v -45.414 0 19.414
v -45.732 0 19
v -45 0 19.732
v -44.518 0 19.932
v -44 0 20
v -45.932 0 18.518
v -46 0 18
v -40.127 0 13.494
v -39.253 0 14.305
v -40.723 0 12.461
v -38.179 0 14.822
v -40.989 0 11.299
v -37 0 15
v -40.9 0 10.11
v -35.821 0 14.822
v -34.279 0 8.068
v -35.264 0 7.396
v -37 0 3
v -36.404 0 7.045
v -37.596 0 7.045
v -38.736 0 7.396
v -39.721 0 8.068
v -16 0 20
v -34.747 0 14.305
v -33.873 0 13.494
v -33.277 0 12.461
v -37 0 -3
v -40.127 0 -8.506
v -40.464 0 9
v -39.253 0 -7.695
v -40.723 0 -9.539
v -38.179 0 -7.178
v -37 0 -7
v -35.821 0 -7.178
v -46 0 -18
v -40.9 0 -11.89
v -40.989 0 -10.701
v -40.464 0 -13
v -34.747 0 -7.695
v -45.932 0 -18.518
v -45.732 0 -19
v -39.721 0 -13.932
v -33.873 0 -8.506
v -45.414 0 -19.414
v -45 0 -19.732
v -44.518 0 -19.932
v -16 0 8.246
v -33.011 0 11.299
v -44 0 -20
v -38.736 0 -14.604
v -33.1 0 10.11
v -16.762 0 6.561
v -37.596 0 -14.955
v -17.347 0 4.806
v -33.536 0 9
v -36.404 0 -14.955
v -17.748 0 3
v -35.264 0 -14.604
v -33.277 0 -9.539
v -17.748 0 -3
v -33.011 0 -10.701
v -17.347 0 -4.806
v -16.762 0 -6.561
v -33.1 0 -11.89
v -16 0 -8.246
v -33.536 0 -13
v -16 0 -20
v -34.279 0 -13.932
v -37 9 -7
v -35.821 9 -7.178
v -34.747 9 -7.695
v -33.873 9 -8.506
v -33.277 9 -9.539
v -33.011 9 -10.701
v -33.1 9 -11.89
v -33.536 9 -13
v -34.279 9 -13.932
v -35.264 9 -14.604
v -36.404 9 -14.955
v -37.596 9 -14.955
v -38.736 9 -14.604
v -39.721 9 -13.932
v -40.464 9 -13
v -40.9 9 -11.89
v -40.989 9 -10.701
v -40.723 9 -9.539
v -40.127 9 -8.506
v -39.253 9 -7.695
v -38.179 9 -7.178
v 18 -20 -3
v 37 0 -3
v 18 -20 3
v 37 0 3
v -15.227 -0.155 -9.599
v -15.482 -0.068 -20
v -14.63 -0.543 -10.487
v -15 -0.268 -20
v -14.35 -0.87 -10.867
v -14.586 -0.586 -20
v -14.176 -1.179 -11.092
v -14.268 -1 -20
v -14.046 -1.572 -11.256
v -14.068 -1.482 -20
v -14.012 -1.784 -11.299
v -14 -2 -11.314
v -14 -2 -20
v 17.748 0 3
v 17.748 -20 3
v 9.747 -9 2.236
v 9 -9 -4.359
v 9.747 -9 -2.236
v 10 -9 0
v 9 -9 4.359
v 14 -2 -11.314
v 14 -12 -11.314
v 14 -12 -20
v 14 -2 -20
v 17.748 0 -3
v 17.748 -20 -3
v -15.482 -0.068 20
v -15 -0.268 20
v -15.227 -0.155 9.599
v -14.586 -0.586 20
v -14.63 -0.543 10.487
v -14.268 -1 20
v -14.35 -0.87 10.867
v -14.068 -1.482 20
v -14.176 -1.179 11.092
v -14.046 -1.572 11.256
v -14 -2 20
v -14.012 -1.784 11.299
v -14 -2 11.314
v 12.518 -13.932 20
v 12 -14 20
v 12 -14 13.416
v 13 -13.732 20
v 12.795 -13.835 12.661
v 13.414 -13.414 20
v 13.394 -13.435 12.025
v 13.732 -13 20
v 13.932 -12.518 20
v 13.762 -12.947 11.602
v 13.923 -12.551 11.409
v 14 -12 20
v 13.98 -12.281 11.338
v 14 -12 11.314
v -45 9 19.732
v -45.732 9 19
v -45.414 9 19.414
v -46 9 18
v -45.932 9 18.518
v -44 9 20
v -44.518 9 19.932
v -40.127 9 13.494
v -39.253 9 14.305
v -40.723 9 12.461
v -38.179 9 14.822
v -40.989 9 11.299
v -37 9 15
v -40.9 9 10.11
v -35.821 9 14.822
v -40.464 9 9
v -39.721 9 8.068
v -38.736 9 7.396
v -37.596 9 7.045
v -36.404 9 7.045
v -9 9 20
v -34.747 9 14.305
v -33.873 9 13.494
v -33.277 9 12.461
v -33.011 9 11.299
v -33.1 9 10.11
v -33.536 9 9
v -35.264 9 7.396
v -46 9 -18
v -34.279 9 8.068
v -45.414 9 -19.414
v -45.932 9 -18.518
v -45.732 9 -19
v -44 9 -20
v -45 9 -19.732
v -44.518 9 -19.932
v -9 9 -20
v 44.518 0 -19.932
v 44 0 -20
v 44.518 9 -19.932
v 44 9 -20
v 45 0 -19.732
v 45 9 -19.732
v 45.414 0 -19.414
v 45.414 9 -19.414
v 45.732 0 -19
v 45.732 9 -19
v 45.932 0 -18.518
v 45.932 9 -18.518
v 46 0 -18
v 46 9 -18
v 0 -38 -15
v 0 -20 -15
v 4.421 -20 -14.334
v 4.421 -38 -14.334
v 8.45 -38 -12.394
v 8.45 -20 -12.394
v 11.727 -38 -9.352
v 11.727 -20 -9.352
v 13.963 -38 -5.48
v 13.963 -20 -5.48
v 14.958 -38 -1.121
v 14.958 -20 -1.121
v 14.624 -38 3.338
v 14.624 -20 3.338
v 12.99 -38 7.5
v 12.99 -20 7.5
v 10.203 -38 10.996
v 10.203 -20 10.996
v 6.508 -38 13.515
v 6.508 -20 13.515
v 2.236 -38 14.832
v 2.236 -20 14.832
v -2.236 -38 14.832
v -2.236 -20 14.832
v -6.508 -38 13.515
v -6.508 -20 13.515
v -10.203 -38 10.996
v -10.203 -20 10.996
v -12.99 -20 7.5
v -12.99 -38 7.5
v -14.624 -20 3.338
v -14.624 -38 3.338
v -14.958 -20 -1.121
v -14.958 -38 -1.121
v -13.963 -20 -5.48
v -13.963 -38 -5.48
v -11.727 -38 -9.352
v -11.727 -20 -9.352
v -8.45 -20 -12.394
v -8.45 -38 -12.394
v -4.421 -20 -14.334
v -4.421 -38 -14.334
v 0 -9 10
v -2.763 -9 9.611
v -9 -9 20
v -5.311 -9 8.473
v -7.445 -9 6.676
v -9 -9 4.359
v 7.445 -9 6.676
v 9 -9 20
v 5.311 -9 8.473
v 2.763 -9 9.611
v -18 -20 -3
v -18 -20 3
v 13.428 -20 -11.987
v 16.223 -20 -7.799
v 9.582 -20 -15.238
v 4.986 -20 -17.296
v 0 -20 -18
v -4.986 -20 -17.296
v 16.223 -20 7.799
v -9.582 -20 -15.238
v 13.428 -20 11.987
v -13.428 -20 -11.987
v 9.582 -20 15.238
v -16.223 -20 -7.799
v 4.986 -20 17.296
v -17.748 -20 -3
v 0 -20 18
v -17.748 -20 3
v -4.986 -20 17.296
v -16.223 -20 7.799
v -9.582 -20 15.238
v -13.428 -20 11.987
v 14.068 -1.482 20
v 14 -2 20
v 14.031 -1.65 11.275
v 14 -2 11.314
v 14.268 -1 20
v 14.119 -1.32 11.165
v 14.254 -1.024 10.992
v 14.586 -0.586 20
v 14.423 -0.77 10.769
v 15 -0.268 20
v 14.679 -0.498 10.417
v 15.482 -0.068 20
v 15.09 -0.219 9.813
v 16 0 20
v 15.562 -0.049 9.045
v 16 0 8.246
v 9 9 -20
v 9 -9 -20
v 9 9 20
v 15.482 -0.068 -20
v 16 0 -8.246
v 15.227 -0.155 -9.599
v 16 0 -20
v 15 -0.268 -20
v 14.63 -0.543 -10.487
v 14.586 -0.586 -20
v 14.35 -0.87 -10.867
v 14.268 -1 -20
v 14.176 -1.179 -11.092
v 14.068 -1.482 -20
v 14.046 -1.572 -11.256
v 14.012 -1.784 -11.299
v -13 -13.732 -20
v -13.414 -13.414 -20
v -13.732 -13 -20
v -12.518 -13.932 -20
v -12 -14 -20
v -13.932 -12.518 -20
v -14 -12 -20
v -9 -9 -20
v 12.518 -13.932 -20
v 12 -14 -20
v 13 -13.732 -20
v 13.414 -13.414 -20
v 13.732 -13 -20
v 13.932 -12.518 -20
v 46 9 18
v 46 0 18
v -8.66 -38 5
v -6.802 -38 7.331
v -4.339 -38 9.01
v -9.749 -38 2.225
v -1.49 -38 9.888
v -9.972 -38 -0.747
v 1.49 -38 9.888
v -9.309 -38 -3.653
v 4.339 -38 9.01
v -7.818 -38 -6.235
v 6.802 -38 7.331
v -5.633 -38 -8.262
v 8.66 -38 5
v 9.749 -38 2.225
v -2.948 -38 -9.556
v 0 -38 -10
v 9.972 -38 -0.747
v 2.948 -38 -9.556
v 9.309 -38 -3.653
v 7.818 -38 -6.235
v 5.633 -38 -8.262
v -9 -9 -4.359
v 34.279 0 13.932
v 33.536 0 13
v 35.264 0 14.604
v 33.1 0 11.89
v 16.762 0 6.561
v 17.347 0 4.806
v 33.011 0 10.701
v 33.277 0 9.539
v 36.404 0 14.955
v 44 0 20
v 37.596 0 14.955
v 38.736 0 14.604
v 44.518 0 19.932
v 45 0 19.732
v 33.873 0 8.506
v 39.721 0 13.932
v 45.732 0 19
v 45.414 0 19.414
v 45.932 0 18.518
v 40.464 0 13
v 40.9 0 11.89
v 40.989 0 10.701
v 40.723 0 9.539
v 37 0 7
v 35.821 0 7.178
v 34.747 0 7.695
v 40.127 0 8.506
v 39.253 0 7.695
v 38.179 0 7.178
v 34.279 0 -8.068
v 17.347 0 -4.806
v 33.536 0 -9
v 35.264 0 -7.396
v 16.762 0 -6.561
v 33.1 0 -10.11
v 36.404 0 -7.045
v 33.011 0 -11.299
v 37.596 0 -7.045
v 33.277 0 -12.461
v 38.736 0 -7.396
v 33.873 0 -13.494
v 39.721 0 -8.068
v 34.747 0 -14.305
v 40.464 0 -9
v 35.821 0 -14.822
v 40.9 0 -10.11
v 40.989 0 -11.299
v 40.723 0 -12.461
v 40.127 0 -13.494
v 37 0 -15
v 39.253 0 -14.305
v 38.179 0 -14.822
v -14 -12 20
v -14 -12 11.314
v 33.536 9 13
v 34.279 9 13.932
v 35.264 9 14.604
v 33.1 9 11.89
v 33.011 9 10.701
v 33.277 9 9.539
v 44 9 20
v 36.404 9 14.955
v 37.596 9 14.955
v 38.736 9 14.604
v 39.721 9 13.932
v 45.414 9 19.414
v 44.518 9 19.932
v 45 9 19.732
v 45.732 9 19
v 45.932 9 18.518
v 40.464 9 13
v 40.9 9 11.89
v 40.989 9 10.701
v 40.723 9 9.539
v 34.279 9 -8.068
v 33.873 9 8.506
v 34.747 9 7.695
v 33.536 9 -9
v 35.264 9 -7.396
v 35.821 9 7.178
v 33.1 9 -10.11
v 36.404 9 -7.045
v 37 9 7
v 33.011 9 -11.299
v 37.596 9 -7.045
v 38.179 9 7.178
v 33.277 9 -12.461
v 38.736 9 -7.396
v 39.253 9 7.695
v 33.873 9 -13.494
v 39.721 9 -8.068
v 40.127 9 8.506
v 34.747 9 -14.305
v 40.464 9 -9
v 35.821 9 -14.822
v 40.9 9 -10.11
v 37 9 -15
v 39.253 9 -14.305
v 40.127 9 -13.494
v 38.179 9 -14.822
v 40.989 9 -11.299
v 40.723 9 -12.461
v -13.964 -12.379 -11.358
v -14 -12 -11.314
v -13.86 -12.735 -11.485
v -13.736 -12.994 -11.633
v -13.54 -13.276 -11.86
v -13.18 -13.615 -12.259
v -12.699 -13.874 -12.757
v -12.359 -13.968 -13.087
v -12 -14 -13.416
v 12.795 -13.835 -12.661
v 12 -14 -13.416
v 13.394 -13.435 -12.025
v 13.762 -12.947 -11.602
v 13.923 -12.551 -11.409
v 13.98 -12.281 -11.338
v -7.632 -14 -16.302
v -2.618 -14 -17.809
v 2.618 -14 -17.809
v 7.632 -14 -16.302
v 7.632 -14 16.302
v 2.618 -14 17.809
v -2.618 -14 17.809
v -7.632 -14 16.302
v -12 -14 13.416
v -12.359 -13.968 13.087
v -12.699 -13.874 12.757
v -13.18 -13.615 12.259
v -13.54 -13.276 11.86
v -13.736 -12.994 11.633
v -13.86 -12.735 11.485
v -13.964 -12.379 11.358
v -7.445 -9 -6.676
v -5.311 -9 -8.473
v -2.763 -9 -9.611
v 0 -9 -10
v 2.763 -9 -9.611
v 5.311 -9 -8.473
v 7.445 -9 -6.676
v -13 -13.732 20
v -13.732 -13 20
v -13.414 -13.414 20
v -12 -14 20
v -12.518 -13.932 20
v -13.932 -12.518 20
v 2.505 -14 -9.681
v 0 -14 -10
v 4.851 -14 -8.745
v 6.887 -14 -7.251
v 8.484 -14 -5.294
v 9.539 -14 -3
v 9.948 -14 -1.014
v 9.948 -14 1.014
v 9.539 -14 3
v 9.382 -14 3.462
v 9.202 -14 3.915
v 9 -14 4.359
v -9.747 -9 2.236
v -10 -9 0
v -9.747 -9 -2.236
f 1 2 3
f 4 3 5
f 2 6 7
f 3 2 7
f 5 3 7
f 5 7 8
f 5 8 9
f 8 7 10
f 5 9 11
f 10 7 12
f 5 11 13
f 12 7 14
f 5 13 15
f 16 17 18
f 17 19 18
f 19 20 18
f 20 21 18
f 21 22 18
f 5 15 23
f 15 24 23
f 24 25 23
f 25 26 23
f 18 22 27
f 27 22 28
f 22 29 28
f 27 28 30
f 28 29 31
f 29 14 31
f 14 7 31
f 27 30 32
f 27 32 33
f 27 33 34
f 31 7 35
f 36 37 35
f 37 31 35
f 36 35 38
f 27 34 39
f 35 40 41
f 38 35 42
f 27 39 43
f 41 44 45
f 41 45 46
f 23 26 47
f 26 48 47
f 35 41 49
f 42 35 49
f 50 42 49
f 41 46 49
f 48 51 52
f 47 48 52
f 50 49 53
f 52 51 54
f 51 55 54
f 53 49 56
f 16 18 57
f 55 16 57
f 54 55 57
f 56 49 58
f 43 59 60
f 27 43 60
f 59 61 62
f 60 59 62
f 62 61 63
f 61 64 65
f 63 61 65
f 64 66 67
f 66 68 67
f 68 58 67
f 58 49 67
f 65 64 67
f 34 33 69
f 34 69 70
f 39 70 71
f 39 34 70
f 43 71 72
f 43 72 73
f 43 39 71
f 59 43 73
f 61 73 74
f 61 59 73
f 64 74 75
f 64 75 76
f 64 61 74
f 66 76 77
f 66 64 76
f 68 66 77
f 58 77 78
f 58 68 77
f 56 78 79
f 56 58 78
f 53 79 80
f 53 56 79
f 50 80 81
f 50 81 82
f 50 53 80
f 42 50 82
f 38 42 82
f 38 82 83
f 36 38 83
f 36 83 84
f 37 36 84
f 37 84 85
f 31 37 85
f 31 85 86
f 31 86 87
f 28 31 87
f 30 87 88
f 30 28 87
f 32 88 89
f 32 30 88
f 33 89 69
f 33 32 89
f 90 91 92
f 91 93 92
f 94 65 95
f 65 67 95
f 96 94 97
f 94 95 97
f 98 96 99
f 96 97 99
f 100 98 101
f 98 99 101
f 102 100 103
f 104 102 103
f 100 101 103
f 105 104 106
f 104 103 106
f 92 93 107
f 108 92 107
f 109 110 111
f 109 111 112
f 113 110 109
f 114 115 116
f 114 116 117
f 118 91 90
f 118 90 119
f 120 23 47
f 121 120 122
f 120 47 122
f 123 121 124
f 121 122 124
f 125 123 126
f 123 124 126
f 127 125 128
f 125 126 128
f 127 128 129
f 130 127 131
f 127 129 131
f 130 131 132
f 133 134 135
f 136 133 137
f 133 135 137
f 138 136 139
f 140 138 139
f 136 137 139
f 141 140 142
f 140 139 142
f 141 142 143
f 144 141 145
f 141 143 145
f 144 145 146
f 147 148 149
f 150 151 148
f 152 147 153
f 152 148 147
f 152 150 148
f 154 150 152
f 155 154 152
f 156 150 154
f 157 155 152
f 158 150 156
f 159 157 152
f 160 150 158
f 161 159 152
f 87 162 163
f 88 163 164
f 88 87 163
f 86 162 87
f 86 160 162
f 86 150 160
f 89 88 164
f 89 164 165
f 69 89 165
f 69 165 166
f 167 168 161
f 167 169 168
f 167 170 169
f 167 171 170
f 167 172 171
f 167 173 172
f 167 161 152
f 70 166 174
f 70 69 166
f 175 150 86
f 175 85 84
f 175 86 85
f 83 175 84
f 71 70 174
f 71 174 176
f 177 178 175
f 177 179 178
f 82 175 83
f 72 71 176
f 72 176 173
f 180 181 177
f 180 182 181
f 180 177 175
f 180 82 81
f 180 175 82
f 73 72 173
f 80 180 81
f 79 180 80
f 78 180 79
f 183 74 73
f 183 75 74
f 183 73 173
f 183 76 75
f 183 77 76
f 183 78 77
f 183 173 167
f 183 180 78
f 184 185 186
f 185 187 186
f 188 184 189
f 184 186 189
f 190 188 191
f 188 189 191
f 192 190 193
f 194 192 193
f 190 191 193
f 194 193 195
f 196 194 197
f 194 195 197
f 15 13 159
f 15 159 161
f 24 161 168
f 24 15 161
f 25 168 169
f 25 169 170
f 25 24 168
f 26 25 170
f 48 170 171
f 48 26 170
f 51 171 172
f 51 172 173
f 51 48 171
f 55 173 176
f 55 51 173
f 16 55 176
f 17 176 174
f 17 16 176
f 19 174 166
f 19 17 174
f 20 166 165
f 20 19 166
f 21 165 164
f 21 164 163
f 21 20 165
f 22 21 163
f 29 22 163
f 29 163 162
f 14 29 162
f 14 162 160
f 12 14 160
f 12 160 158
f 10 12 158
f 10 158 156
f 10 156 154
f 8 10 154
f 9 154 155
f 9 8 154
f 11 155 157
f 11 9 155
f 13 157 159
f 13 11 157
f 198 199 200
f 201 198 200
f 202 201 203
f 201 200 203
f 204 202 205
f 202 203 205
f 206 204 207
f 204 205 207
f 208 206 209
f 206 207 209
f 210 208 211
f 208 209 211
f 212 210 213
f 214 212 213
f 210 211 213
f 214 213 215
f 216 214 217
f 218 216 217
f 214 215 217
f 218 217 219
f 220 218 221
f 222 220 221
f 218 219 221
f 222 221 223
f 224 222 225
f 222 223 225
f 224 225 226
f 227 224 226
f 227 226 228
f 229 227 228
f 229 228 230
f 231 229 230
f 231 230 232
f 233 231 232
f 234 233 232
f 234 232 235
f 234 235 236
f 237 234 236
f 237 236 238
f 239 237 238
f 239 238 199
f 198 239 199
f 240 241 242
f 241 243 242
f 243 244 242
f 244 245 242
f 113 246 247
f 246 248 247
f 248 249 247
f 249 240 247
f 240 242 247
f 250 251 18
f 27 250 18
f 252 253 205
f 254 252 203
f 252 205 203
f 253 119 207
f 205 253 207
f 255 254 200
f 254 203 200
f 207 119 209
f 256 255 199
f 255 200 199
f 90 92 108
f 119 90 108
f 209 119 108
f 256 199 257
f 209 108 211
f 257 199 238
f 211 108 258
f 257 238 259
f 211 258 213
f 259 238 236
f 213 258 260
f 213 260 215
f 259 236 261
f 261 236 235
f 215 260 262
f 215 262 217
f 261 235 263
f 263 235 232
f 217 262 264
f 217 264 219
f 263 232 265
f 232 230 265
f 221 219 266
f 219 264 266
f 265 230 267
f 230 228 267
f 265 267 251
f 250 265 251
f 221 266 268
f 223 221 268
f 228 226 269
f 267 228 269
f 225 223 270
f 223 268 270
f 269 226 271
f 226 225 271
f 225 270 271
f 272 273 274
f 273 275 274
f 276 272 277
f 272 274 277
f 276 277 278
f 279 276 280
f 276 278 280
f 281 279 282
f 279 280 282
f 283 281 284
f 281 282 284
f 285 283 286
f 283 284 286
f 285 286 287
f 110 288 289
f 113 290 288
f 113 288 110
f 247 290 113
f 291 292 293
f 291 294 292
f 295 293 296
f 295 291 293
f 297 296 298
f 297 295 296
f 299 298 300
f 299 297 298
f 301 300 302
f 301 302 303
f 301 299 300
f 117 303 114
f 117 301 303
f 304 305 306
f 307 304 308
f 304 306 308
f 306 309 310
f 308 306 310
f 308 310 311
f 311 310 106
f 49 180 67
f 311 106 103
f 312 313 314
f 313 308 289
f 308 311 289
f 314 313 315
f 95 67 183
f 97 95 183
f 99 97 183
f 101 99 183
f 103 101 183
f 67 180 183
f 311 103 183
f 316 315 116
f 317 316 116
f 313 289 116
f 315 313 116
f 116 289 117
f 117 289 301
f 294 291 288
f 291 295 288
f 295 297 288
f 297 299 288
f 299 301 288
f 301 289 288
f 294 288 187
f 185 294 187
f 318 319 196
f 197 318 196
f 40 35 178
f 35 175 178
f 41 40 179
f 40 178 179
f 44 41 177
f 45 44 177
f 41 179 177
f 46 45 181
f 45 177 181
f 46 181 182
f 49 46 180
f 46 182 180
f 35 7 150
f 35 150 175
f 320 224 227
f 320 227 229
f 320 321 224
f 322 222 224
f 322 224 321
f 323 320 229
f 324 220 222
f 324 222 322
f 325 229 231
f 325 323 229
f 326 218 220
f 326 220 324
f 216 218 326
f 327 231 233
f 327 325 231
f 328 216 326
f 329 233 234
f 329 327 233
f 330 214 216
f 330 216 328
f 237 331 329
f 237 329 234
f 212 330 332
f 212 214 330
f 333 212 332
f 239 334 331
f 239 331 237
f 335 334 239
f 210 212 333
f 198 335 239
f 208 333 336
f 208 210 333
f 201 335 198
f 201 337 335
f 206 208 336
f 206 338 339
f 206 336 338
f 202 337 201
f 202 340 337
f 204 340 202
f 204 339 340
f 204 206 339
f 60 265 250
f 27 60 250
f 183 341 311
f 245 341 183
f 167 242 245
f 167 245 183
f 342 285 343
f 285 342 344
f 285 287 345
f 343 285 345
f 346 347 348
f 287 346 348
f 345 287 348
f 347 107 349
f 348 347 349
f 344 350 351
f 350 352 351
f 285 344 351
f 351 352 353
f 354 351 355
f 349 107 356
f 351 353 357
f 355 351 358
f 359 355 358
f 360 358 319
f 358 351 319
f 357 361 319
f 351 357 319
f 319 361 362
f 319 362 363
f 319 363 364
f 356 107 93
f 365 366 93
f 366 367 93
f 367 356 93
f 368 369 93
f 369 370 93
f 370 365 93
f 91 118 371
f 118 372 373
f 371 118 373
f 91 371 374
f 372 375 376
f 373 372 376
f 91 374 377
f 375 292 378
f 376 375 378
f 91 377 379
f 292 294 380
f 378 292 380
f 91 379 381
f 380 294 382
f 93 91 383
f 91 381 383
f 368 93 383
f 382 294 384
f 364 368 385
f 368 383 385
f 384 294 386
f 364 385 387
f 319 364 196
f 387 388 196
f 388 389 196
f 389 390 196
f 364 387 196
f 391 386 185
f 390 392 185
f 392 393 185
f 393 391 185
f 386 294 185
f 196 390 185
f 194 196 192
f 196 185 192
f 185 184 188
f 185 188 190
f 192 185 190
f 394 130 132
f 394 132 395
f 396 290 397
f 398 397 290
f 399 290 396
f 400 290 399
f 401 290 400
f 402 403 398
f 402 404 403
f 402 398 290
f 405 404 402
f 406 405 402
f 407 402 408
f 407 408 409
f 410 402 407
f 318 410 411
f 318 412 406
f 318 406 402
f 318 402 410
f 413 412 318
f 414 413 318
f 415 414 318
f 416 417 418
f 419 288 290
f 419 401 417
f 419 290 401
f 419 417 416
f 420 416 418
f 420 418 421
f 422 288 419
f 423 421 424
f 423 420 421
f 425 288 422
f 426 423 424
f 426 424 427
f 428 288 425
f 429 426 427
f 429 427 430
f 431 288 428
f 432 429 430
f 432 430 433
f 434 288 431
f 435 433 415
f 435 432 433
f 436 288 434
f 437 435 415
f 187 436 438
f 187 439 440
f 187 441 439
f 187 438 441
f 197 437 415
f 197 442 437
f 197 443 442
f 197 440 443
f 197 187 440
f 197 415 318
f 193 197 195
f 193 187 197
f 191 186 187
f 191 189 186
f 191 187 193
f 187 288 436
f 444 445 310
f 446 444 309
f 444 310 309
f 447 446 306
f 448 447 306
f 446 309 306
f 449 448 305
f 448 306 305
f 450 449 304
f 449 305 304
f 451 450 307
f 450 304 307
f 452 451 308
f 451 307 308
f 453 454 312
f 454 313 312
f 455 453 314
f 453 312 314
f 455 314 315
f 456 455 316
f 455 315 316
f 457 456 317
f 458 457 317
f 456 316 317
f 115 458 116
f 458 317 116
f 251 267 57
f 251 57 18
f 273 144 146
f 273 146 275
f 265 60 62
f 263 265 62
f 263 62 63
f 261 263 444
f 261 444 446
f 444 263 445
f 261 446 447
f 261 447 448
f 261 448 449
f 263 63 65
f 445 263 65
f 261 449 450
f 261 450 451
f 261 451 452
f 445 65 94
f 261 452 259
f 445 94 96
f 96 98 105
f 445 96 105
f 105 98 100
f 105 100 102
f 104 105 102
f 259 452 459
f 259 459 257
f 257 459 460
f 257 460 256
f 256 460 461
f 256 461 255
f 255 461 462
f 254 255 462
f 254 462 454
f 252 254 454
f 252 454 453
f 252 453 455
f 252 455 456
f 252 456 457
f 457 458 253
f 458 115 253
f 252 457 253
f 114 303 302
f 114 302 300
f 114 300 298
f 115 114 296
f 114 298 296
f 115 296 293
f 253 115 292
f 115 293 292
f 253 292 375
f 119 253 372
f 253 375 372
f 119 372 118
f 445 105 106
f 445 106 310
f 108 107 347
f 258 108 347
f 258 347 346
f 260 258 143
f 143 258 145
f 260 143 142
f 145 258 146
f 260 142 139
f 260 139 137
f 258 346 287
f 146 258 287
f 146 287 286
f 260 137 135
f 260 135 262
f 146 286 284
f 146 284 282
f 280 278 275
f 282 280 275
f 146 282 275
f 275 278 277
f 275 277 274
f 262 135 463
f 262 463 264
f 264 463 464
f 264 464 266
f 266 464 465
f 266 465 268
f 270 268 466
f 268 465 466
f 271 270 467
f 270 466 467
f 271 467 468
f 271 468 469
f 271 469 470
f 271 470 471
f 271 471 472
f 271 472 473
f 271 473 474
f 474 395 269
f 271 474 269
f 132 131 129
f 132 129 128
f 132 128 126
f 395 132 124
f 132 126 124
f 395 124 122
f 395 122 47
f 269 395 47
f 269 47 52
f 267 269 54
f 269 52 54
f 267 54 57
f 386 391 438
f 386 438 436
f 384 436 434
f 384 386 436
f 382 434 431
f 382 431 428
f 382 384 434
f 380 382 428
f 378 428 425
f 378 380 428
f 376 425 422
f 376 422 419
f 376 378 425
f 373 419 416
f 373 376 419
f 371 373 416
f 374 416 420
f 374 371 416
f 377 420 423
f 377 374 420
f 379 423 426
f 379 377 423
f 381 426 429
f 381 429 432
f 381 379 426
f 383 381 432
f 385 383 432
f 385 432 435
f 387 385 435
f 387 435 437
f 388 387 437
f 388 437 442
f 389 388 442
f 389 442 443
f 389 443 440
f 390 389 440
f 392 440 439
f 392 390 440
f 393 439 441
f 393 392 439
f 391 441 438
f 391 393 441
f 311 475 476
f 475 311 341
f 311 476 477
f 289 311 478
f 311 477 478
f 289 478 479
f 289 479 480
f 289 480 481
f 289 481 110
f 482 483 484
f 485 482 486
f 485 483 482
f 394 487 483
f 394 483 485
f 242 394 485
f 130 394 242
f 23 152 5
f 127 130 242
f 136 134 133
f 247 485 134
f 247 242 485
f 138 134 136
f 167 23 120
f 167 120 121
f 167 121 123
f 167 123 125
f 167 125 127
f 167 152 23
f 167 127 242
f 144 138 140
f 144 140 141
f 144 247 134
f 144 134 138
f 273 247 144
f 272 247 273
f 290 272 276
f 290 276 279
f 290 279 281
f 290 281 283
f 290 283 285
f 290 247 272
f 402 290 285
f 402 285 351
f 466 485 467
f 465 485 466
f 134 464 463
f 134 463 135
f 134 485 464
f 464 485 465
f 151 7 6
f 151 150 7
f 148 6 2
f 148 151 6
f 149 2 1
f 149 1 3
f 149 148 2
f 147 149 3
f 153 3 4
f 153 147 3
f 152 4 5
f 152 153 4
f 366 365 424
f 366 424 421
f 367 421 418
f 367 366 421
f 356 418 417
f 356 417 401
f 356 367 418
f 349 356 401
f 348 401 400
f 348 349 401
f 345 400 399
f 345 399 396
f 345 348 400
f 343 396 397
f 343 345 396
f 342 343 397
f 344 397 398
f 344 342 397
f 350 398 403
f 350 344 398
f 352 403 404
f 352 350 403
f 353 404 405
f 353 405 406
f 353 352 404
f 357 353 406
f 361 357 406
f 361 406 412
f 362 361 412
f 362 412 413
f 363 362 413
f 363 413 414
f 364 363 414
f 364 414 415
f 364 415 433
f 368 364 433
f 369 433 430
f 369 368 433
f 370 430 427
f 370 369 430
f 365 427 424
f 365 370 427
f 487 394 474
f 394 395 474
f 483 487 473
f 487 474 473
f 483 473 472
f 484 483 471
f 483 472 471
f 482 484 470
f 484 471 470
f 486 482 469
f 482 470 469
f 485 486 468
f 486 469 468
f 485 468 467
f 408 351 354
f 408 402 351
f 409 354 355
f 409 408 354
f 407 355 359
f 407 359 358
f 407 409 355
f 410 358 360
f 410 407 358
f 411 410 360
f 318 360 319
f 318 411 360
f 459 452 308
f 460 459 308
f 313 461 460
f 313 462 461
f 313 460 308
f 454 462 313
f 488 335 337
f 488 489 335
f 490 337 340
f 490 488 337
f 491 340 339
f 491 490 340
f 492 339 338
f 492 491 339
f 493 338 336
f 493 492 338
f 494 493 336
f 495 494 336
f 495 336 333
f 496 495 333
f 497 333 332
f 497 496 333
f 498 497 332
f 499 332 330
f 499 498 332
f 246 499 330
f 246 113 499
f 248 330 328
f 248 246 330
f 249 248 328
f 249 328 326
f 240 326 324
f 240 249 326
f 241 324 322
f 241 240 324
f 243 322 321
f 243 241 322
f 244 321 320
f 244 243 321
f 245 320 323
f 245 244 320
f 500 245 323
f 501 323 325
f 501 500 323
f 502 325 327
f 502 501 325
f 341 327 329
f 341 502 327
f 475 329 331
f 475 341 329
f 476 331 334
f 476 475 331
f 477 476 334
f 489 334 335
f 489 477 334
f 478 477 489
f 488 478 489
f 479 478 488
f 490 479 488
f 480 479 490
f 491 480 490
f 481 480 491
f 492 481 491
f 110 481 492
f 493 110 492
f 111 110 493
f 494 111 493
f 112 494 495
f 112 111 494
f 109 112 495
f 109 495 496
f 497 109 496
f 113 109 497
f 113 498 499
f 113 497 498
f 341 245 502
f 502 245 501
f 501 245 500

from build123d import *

# Parameters (mm, degrees)
SKETCH1_W           = 92
SKETCH1_H           = 40
SKETCH1_R           = 4
BOSS_EXTRUDE2_DEPTH = 9
SKETCH3_R           = 18
SKETCH3_R_2         = 10
BOSS_EXTRUDE3_DEPTH = 20
SKETCH4_R           = 15
SKETCH4_R_2         = 10
BOSS_EXTRUDE4_DEPTH = 18
CUT_EXTRUDE1_REACH  = 73.833
SKETCH8_W           = 18
SKETCH8_H           = 18
CUT_EXTRUDE2_REACH  = 73.833
SKETCH9_W           = 28
SKETCH9_H           = 14
BOSS_EXTRUDE5_DEPTH = 40
BOSS_EXTRUDE9_DEPTH = 3
CUT_EXTRUDE5_REACH  = 73.833
SKETCH8_3_W         = 18
SKETCH8_3_H         = 18
CUT_EXTRUDE6_START  = -6
CUT_EXTRUDE6_DEPTH  = 6
CUT_EXTRUDE7_START  = -5
SKETCH19_R          = 10
CUT_EXTRUDE7_DEPTH  = 5
FILLET1_R           = 2
FILLET2_R           = 2


with BuildPart() as part:
    # Sketch1 → Boss-Extrude2 (new body)
    with BuildSketch(Plane(origin=(0, 0, 0), x_dir=(1, 0, 0), z_dir=(0, 1, 0))):
        Rectangle(SKETCH1_W, SKETCH1_H)
        with Locations(Location((-37, 11, 0), (0, 0, 270))):
            Circle(SKETCH1_R, mode=Mode.SUBTRACT)
        with Locations(Location((-37, -11, 0), (0, 0, 270))):
            Circle(SKETCH1_R, mode=Mode.SUBTRACT)
        with Locations(Location((37, -11, 0), (0, 0, 90))):
            Circle(SKETCH1_R, mode=Mode.SUBTRACT)
        with Locations(Location((37, 11, 0), (0, 0, 90))):
            Circle(SKETCH1_R, mode=Mode.SUBTRACT)
    extrude(amount=BOSS_EXTRUDE2_DEPTH)

    # Sketch3 → Boss-Extrude3 (add)
    with BuildSketch(Plane.XZ):
        with Locations(Location((0, 0, 0), (0, 0, 270))):
            Circle(SKETCH3_R)
        with Locations(Location((0, 0, 0), (0, 0, 270))):
            Circle(SKETCH3_R_2, mode=Mode.SUBTRACT)
    extrude(amount=BOSS_EXTRUDE3_DEPTH)

    # Sketch4 → Boss-Extrude4 (add)
    with BuildSketch(Plane.XZ.offset(20)):
        with Locations(Location((0, 0, 0), (0, 0, 270))):
            Circle(SKETCH4_R)
        with Locations(Location((0, 0, 0), (0, 0, 270))):
            Circle(SKETCH4_R_2, mode=Mode.SUBTRACT)
    extrude(amount=BOSS_EXTRUDE4_DEPTH)

    # Sketch8 → Cut-Extrude1 (cut, up to next)
    with BuildSketch(Plane.XY.offset(20), mode=Mode.PRIVATE) as cut_extrude1_sk1:
        Rectangle(SKETCH8_W, SKETCH8_H)
    cut_extrude1_tool1 = extrude(cut_extrude1_sk1.sketch, amount=-CUT_EXTRUDE1_REACH, mode=Mode.PRIVATE) & part.part
    add(cut_extrude1_tool1.solids().sort_by_distance((0, 0, 20))[0], mode=Mode.SUBTRACT)

    # Sketch9 → Cut-Extrude2 (cut, up to next)
    with BuildSketch(Plane.XY.offset(20), mode=Mode.PRIVATE) as cut_extrude2_sk1:
        with Locations((0, -7)):
            Rectangle(SKETCH9_W, SKETCH9_H)
    cut_extrude2_tool1 = extrude(cut_extrude2_sk1.sketch, amount=-CUT_EXTRUDE2_REACH, mode=Mode.PRIVATE) & part.part
    add(cut_extrude2_tool1.solids().sort_by_distance((0, -7, 20))[0], mode=Mode.SUBTRACT)

    # Sketch10 → Boss-Extrude5 (add)
    with BuildSketch(Plane.XY.offset(20)):
        Polygon((9, 0), (9, -9), (-8.881269958, -9), (-9, 0), (-14, 0), (-14, -14), (14, -14), (14, 0), align=None)
    extrude(amount=-BOSS_EXTRUDE5_DEPTH)

    # Sketch13 → Boss-Extrude9 (add, symmetric)
    with BuildSketch(Plane.XY):
        Polygon((-18, -20), (-37, 0), (-18, 0), (-9, 0), (9, 0), (18, 0), (37, 0), (18, -20), align=None)
    extrude(amount=BOSS_EXTRUDE9_DEPTH, both=True)

    # Sketch8<3> → Cut-Extrude5 (cut, up to next)
    with BuildSketch(Plane.XY.offset(20), mode=Mode.PRIVATE) as cut_extrude5_sk1:
        Rectangle(SKETCH8_3_W, SKETCH8_3_H)
    cut_extrude5_tool1 = extrude(cut_extrude5_sk1.sketch, amount=-CUT_EXTRUDE5_REACH, mode=Mode.PRIVATE) & part.part
    add(cut_extrude5_tool1.solids().sort_by_distance((0, 0, 20))[0], mode=Mode.SUBTRACT)

    # Sketch18 → Cut-Extrude6 (cut)
    with BuildSketch(Plane.XZ.offset(20).offset(CUT_EXTRUDE6_START)):
        with BuildLine():
            Line((9.539392014, 3), (-9.539392014, 3))
            ThreePointArc((-9.539392014, 3), (-10, 0), (-9.539392014, -3))
            Line((-9.539392014, -3), (9.539392014, -3))
            ThreePointArc((9.539392014, -3), (10, 0), (9.539392014, 3))
        make_face()
    extrude(amount=CUT_EXTRUDE6_DEPTH, mode=Mode.SUBTRACT)

    # Sketch19 → Cut-Extrude7 (cut)
    with BuildSketch(Plane.XZ.offset(14).offset(CUT_EXTRUDE7_START)):
        with Locations(Location((0, 0, 0), (0, 0, 25.841932763))):
            Circle(SKETCH19_R)
    extrude(amount=CUT_EXTRUDE7_DEPTH, mode=Mode.SUBTRACT)

    # Fillet1
    fillet1_edges = [part.edges().sort_by_distance(p)[0] for p in [
        (46, 4.5, 20),
        (-46, 4.5, 20),
        (-46, 4.5, -20),
        (46, 4.5, -20),
    ]]
    fillet(fillet1_edges, radius=FILLET1_R)

    # Fillet2
    fillet2_edges = [part.edges().sort_by_distance(p)[0] for p in [
        (14, -14, 15.656854249),
        (14, -14, -15.656854249),
        (14, 0, -15.656854249),
        (14, 0, 15.656854249),
        (-14, -14, 15.656854249),
        (-14, -14, -15.656854249),
        (-14, 0, -15.656854249),
        (-14, 0, 15.656854249),
    ]]
    fillet(fillet2_edges, radius=FILLET2_R)


solid = part.part
